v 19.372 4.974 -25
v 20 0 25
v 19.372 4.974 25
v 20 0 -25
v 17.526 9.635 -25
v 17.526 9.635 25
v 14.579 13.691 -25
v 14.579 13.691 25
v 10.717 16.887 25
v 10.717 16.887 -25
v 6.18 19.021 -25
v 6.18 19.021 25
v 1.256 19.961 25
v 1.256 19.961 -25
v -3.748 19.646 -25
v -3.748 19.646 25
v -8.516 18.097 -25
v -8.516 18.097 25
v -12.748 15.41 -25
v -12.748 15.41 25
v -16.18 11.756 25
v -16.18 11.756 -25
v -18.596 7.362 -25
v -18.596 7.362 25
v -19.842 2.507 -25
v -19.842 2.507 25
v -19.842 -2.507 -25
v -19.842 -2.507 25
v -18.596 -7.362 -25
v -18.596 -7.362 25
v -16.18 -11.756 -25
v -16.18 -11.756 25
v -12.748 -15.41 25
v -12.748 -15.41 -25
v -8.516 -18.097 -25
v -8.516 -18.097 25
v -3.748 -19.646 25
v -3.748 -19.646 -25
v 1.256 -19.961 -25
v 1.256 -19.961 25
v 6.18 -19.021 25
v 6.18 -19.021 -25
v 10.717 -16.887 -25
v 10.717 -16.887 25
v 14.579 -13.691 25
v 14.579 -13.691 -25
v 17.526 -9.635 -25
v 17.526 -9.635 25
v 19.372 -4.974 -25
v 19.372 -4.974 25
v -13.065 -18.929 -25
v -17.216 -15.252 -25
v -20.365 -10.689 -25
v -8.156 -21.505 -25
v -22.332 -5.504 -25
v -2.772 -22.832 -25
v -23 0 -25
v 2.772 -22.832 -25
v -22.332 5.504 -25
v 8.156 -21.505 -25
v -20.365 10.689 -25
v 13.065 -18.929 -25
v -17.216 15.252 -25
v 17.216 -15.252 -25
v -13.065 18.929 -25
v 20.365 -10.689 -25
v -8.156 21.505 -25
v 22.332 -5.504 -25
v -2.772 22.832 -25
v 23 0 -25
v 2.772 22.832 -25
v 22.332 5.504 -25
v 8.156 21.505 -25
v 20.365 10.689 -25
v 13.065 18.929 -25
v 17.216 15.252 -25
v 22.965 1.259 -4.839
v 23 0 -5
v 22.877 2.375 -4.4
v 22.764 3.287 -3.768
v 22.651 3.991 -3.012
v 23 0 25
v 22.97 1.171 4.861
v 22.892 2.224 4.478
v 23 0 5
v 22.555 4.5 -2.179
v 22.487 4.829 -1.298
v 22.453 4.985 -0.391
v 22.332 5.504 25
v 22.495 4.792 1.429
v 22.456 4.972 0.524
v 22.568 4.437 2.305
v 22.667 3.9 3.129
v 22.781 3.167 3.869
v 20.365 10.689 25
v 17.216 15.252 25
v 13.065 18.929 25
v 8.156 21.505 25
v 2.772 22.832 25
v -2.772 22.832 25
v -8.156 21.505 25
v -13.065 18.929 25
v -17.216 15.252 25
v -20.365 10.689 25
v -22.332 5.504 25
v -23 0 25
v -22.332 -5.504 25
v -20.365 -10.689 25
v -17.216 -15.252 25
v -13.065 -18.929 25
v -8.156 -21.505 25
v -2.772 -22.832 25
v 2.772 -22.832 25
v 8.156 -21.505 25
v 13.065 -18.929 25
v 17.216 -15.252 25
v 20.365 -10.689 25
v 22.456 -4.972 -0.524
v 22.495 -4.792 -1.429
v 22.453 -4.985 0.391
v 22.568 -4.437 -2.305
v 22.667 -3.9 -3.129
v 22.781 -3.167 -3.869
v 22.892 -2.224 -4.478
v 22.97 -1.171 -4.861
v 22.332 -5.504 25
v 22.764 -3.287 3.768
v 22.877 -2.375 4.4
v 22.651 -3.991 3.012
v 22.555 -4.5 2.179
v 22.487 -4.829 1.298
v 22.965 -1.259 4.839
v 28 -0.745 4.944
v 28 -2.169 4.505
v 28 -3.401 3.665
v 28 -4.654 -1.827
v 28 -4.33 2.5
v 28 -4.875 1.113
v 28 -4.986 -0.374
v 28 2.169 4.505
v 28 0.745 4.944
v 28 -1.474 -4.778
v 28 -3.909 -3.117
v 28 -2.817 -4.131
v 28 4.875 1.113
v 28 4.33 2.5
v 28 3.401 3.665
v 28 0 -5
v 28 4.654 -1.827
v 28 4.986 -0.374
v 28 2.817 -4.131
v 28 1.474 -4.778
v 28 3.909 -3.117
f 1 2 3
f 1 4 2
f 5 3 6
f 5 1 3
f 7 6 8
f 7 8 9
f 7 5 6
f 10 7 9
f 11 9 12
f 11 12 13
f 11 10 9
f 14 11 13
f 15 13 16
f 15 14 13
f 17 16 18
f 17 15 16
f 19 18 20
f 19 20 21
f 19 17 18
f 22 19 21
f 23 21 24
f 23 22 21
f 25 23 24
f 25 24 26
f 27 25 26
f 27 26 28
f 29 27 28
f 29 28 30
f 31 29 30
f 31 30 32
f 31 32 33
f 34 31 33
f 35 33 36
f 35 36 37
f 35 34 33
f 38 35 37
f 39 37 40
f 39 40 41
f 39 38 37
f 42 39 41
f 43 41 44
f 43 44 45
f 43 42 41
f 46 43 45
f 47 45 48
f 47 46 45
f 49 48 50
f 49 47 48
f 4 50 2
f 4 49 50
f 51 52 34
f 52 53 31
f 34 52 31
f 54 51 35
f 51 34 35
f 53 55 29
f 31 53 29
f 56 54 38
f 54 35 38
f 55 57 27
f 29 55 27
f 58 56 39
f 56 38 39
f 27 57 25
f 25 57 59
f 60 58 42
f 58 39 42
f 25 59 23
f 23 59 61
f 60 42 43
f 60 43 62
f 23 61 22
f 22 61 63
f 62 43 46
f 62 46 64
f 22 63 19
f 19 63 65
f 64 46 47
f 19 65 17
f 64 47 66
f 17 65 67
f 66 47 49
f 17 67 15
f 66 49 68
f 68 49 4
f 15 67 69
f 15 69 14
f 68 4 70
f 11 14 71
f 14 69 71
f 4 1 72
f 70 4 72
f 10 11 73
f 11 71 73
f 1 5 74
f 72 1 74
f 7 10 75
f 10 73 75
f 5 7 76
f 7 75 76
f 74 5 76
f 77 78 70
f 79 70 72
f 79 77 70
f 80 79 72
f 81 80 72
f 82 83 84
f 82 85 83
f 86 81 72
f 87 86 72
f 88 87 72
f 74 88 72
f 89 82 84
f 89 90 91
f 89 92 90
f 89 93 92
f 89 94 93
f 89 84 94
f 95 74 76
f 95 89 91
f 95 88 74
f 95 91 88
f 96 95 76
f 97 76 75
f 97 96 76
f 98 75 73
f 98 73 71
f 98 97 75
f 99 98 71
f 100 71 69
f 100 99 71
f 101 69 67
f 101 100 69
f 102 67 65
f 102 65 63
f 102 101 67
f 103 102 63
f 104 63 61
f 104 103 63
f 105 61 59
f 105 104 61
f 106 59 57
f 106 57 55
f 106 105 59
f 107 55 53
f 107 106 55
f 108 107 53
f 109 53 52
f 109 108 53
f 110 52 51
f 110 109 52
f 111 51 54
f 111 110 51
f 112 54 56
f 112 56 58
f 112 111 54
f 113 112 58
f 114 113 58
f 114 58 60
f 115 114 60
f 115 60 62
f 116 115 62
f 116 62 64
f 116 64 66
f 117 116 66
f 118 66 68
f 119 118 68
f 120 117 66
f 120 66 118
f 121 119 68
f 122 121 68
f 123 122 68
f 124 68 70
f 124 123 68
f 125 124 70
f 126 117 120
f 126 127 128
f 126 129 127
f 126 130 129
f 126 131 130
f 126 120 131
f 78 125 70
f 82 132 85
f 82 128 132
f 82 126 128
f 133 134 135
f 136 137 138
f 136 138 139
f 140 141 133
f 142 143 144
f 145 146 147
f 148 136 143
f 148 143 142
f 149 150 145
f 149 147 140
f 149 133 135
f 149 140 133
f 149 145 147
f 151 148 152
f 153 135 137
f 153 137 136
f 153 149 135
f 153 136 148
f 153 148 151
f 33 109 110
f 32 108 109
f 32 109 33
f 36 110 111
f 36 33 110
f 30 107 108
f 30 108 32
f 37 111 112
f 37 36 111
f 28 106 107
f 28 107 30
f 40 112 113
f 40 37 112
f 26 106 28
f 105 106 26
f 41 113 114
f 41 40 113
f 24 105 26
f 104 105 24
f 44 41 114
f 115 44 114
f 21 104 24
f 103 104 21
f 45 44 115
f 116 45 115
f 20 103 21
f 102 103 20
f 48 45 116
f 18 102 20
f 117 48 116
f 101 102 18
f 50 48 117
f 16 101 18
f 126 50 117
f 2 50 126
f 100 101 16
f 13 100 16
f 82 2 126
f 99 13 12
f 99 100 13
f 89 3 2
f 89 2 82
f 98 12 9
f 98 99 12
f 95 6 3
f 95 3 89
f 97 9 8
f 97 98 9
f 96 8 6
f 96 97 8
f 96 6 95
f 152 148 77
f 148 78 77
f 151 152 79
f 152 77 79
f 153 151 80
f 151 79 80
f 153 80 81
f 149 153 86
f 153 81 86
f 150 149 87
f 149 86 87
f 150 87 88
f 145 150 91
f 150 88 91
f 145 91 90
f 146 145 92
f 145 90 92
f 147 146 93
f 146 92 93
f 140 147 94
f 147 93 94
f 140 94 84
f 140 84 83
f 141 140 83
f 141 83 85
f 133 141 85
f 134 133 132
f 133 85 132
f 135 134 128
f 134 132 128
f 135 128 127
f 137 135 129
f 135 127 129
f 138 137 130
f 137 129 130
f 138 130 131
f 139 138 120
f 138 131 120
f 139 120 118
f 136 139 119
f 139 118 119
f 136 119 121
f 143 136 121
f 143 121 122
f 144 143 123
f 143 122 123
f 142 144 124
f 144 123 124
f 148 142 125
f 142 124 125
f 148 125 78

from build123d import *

# Parameters (mm, degrees)
ESQUISSE1_R                    = 23
ESQUISSE1_R_2                  = 20
BOSS_EXTRU_1_DEPTH             = 25
BOSS_EXTRU_2_REACH             = 59.184
BOSS_EXTRU_2_END_RADIUS        = 23
ESQUISSE2_R                    = 5
BOSS_EXTRU_2_DIRECTION_2_DEPTH = 5


with BuildPart() as part:
    # Esquisse1 → Boss.-Extru.1 (new, symmetric)
    with BuildSketch(Plane.XY):
        Circle(ESQUISSE1_R)
        Circle(ESQUISSE1_R_2, mode=Mode.SUBTRACT)
    extrude(amount=BOSS_EXTRU_1_DEPTH, both=True)

    # Boss.-Extru.2: up to this cylinder (the profile starts outside it)
    boss_extru_2_end = Plane(origin=(0, 0, 0), z_dir=(0, 0, -1)) * Cylinder(BOSS_EXTRU_2_END_RADIUS, 165.368, mode=Mode.PRIVATE)
    # Esquisse2 → Boss.-Extru.2 (add, up to the surface)
    with BuildSketch(Plane(origin=(23, 0, 0), x_dir=(0, 0, -1), z_dir=(1, 0, 0)), mode=Mode.PRIVATE) as boss_extru_2_sk1:
        Circle(ESQUISSE2_R)
    boss_extru_2_tool1 = extrude(boss_extru_2_sk1.sketch, amount=-BOSS_EXTRU_2_REACH, mode=Mode.PRIVATE) - boss_extru_2_end
    add(boss_extru_2_tool1.solids().sort_by_distance((23, 0, 0))[0])
    add(boss_extru_2_tool1.solids().sort_by_distance((23, 0, 0))[1])

    # Esquisse2 → Boss.-Extru.2 direction 2 (add)
    with BuildSketch(Plane(origin=(23, 0, 0), x_dir=(0, 0, -1), z_dir=(1, 0, 0))):
        Circle(ESQUISSE2_R)
    extrude(amount=BOSS_EXTRU_2_DIRECTION_2_DEPTH)


solid = part.part
